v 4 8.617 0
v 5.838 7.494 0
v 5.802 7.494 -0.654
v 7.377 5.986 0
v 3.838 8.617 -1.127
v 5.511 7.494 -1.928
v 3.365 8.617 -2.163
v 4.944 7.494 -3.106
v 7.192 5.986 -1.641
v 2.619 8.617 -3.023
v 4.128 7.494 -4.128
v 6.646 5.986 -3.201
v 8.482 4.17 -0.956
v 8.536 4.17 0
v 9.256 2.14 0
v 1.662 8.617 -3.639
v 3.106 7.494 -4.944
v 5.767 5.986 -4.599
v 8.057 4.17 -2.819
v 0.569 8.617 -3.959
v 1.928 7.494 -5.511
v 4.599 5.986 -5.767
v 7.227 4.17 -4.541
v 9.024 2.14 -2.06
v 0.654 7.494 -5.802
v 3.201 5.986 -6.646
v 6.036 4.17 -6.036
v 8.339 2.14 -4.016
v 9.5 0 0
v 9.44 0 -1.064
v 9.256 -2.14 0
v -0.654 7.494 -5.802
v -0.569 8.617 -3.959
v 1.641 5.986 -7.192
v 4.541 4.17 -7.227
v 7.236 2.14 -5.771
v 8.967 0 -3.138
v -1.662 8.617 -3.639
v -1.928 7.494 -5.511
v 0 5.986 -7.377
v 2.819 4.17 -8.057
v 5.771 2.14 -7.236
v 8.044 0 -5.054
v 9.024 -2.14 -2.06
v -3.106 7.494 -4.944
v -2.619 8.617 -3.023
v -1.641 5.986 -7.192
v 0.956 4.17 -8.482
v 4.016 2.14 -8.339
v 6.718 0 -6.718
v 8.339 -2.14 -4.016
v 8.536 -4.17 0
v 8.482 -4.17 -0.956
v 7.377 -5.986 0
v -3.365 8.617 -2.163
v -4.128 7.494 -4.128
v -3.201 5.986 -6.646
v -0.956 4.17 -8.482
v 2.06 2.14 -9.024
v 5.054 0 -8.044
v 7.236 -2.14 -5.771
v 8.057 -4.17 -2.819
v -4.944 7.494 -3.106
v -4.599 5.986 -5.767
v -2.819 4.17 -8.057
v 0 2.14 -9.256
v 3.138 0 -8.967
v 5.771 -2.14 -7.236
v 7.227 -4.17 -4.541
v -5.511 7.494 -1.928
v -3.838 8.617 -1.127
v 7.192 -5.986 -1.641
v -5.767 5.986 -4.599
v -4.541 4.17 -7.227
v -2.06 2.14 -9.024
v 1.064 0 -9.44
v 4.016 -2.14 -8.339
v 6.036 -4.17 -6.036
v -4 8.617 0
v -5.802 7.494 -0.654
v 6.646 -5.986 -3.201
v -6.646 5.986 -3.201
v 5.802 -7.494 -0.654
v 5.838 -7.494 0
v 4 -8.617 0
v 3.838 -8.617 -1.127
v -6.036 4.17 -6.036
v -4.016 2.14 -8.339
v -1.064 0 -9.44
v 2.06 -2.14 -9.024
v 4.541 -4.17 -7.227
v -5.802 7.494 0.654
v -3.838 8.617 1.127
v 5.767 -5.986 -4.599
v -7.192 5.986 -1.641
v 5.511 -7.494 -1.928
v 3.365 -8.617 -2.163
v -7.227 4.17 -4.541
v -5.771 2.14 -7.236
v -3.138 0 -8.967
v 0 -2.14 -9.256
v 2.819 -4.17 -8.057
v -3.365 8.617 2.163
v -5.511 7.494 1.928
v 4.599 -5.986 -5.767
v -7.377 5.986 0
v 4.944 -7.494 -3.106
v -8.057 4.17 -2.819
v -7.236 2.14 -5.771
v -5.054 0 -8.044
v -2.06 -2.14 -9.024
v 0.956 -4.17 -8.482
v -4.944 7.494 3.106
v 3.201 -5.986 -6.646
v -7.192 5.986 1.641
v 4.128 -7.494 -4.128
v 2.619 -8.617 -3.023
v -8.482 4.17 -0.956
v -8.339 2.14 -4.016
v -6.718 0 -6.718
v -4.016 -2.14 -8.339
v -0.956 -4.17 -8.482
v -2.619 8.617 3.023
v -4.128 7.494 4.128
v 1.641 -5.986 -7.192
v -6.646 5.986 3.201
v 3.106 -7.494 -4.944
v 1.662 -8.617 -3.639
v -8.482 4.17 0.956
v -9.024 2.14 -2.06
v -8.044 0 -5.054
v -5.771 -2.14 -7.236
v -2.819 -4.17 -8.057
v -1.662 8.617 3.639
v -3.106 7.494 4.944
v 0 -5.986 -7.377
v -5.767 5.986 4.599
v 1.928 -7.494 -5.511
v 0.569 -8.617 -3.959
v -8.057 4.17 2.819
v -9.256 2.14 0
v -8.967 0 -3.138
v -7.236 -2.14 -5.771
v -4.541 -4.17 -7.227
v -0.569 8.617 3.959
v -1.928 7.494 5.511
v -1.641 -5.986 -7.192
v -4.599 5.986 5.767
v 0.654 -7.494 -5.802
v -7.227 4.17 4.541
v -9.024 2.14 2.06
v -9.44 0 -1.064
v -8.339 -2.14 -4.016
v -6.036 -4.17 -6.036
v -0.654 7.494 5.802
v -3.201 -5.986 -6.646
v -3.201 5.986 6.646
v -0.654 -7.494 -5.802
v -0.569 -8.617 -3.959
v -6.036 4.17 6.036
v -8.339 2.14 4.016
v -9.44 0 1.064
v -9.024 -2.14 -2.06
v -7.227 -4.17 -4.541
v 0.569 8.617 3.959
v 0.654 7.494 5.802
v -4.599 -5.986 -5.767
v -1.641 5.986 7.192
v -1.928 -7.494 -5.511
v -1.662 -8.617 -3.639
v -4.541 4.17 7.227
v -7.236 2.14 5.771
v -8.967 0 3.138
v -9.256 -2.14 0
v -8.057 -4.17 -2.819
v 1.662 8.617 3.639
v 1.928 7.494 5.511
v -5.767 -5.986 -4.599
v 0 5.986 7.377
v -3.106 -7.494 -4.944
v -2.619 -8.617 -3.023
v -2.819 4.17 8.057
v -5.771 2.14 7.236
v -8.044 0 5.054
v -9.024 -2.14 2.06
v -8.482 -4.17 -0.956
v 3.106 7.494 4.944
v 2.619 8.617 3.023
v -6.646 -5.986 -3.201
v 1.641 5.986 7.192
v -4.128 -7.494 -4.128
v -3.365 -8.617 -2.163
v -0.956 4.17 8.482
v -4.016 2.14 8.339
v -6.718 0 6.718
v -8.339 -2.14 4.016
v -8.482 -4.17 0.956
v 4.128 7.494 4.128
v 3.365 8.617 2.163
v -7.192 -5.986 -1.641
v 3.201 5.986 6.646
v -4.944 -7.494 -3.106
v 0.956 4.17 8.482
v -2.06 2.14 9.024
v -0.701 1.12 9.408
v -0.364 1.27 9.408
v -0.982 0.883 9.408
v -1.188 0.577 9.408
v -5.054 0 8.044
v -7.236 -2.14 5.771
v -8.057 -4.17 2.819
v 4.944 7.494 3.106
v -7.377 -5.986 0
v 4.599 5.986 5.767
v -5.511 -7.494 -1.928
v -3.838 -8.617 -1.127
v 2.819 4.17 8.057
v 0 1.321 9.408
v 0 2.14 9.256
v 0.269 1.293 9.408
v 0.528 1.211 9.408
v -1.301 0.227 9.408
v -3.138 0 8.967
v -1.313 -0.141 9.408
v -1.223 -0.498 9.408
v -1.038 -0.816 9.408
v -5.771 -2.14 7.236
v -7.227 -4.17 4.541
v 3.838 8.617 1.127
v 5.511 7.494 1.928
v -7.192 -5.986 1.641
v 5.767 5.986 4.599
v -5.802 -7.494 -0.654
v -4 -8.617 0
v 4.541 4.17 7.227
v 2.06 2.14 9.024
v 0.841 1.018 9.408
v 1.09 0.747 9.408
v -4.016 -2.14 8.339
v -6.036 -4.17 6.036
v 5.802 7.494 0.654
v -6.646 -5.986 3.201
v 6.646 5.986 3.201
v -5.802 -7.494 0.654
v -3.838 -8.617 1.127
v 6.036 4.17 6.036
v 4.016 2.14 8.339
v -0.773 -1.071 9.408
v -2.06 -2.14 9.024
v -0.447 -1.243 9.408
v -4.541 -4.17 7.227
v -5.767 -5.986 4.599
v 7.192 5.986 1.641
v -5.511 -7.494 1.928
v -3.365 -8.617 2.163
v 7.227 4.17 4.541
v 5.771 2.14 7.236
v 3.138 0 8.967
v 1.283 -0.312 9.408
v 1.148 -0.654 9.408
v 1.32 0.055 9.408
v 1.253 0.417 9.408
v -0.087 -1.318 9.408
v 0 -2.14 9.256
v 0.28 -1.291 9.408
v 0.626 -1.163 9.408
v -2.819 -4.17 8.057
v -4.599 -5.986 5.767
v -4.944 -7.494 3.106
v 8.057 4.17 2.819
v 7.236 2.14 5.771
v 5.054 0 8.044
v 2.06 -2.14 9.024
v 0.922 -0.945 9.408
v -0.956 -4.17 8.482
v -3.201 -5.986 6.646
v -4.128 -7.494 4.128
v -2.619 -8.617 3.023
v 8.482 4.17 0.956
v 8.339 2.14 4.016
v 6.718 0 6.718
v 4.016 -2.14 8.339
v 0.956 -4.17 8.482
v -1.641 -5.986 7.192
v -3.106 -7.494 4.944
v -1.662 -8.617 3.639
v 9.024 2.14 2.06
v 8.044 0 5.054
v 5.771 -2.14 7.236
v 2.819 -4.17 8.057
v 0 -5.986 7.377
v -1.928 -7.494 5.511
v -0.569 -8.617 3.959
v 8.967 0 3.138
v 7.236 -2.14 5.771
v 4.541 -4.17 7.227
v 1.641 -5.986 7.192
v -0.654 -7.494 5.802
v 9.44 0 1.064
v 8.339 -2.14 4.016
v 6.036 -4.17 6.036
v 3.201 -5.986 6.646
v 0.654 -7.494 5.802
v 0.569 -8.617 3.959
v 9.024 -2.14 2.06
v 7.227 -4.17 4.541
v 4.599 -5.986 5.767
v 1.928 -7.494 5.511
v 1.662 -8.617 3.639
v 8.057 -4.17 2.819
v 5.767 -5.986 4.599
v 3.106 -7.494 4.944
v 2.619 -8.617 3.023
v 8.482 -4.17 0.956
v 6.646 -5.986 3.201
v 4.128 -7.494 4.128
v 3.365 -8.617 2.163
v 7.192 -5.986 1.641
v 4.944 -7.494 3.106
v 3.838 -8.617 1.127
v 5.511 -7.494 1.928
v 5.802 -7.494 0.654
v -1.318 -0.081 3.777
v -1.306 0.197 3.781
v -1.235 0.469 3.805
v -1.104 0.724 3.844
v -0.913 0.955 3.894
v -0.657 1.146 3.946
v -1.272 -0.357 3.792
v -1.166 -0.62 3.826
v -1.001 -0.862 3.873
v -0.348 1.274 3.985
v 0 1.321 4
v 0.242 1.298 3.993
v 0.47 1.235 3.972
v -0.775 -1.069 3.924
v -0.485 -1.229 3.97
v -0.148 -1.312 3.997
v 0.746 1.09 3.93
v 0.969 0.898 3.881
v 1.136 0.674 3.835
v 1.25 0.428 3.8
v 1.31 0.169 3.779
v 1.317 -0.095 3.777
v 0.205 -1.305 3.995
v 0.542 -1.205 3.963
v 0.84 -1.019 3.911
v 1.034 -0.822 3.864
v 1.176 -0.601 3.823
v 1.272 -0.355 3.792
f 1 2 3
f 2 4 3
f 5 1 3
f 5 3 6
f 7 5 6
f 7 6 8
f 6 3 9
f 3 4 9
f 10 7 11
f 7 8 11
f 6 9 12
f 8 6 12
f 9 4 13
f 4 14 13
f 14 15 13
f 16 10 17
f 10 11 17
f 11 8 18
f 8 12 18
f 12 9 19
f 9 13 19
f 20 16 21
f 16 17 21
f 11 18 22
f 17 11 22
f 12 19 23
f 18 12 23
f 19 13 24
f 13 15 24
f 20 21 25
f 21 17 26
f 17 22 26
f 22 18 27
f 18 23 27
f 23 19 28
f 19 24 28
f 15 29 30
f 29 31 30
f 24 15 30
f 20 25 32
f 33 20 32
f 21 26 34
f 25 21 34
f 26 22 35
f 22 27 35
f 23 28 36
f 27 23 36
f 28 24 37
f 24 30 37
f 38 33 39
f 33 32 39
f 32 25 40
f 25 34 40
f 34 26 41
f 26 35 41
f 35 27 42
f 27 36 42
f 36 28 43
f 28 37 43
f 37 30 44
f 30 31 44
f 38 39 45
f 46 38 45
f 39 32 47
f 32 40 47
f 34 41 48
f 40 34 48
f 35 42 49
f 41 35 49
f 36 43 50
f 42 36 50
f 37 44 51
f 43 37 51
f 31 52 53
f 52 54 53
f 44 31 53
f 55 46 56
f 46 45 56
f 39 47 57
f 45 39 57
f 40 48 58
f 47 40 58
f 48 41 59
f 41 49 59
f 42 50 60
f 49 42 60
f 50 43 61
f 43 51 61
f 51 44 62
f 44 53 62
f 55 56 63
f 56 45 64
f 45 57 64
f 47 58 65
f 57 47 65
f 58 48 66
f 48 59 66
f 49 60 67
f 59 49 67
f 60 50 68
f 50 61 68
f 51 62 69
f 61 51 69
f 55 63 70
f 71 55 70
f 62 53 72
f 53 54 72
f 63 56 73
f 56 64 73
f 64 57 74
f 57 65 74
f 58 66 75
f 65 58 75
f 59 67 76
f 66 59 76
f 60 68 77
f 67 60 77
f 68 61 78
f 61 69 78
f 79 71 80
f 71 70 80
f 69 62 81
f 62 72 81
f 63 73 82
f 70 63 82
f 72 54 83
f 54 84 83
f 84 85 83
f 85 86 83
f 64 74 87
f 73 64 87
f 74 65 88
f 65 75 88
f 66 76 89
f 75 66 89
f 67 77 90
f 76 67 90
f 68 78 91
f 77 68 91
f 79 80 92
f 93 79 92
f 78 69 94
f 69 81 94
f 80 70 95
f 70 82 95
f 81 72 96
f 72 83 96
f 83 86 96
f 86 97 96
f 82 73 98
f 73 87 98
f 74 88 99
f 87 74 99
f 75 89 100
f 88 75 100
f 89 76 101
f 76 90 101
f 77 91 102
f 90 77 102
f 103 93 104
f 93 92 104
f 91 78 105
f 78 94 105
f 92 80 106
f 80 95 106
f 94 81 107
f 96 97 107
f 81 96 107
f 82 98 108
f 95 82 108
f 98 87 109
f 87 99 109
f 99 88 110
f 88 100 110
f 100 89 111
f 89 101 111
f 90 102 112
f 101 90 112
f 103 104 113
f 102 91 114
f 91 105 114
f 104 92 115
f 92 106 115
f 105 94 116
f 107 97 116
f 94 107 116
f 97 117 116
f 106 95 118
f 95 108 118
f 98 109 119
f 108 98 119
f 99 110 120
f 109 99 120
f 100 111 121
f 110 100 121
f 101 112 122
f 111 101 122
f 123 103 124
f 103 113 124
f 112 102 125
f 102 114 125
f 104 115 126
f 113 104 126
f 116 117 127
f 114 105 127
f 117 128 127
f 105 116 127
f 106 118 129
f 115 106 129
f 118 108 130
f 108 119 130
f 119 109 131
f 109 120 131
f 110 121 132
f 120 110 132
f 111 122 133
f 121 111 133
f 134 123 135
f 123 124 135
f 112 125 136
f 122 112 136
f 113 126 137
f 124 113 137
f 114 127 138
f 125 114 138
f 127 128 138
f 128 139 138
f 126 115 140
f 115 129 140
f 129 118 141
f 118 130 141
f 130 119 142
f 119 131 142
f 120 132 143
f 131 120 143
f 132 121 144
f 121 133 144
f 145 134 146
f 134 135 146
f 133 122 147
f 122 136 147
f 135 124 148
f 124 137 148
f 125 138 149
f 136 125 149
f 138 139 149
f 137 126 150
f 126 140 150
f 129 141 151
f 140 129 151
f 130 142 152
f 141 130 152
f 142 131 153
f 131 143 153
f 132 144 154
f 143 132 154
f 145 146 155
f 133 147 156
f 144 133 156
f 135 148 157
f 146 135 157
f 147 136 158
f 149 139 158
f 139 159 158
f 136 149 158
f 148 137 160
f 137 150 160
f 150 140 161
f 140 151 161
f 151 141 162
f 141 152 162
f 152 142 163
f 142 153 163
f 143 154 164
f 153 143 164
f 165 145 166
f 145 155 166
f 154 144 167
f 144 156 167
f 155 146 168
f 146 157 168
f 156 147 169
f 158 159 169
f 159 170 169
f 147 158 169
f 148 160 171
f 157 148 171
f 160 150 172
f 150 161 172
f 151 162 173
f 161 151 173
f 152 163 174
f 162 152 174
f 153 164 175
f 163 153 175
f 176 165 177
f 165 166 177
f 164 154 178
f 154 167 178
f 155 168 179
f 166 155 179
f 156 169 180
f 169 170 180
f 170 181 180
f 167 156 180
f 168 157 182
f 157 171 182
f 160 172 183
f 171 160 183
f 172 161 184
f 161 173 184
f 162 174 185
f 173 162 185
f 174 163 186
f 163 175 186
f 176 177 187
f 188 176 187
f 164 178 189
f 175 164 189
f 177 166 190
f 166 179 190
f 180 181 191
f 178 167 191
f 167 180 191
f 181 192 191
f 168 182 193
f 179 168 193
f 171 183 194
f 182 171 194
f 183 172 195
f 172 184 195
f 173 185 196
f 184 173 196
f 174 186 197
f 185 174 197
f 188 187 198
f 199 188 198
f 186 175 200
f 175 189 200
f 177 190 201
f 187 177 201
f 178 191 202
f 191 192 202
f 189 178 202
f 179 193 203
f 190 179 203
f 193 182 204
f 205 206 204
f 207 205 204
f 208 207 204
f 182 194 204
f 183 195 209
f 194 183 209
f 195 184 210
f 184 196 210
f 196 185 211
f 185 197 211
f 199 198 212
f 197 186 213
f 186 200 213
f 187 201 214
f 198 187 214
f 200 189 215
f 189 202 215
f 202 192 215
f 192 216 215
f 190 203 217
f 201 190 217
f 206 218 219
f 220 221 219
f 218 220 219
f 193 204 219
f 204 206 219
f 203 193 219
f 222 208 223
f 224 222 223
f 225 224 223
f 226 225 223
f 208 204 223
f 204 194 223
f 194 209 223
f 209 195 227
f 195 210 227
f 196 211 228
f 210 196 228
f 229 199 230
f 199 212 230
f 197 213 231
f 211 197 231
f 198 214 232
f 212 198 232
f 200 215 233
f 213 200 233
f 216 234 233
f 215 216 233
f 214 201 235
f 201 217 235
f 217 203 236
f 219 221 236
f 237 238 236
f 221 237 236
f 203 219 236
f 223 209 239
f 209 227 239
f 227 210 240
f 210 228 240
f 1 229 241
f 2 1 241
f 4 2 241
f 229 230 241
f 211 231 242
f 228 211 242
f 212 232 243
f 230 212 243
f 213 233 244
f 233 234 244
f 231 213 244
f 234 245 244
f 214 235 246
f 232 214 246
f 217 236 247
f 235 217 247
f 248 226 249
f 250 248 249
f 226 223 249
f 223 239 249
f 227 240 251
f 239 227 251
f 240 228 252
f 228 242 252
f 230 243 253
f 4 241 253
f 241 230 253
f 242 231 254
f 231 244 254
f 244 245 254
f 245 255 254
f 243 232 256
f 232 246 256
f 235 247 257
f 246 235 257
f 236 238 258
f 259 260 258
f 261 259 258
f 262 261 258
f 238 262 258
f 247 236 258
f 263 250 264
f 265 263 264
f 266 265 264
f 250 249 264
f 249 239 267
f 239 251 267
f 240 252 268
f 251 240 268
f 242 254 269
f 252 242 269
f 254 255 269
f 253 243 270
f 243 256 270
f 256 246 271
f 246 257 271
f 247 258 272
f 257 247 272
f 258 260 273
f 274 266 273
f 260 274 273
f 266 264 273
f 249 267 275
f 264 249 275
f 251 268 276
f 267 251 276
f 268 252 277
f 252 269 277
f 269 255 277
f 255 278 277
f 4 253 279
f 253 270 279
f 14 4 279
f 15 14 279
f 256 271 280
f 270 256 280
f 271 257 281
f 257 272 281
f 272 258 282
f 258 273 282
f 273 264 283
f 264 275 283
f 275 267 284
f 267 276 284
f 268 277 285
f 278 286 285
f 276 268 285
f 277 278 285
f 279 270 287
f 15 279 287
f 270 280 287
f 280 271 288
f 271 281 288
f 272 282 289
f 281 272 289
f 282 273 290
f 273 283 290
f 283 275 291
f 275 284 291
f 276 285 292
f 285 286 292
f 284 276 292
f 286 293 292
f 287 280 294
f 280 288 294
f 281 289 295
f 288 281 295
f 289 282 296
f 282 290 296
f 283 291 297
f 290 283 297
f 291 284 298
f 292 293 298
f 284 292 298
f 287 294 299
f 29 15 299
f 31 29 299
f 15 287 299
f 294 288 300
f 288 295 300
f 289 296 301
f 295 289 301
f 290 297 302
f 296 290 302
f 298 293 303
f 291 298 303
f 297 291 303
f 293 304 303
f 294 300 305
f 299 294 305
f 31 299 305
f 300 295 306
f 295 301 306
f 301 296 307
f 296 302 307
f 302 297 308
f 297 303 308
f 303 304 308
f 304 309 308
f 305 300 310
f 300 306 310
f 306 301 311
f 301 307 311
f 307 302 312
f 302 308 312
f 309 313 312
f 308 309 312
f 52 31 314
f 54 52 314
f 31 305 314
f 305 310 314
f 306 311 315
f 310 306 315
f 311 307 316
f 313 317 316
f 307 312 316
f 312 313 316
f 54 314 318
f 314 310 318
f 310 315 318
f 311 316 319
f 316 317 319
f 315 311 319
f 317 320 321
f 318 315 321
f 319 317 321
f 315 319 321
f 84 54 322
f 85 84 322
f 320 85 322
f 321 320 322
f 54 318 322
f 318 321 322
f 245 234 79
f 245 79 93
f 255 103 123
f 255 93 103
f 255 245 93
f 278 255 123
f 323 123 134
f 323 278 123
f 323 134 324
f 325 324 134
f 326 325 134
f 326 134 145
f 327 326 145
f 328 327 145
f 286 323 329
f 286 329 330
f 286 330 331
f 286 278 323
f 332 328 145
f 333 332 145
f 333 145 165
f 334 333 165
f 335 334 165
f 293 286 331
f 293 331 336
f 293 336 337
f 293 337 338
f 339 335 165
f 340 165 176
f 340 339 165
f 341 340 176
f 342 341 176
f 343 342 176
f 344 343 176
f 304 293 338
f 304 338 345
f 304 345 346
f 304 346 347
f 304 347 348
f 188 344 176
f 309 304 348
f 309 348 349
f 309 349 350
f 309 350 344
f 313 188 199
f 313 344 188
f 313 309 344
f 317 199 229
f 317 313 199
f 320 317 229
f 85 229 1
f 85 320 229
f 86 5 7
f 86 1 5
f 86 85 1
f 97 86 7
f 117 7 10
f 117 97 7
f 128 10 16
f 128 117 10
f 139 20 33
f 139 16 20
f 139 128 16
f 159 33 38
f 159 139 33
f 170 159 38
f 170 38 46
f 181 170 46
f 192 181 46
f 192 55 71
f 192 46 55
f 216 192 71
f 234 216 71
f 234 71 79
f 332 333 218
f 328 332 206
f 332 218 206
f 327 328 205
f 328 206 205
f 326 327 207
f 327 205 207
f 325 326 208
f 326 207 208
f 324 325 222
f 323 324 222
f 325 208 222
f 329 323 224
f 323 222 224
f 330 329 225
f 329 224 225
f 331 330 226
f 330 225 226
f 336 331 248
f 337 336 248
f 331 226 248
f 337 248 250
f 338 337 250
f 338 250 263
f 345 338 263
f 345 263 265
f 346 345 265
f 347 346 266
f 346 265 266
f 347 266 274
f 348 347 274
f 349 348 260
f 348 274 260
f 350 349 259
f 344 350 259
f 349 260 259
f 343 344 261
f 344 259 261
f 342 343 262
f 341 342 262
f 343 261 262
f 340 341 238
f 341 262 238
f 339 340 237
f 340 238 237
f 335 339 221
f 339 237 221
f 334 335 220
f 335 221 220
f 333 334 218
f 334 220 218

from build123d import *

# Parameters (mm, degrees)
CORTAR_EXTRUIR1_DEPTH      = 17.454482672
CORTAR_EXTRUIR1_DEPTH_BACK = 10
CROQUIS2_R                 = 4
CROQUIS4_W                 = 1.3208
CROQUIS4_H                 = 9.5


with BuildPart() as part:
    # Croquis1 → Revolución1 (revolve)
    with BuildSketch(Plane.XY):
        with BuildLine():
            Line((0, -9.5), (0, 9.5))
            ThreePointArc((0, 9.5), (9.5, 0), (0, -9.5))
        make_face()
    revolve(axis=Axis((0, -9.5, 0), (0, 1, 0)))

    # Croquis2 → Cortar-Extruir1 (cut, two sides: drawn at the far end of the back side and taken through both)
    with BuildSketch(Plane(origin=(0, 0, 0), x_dir=(1, 0, 0), z_dir=(0, 1, 0)).offset(-CORTAR_EXTRUIR1_DEPTH_BACK)):
        with Locations(Location((0, 0, 0), (0, 0, 180))):
            Circle(CROQUIS2_R)
    extrude(amount=CORTAR_EXTRUIR1_DEPTH + CORTAR_EXTRUIR1_DEPTH_BACK, mode=Mode.SUBTRACT)

    # Croquis4 → Diámetro de taladro #37 (0.104)1 (revolve, cut)
    with BuildSketch(Plane.YZ):
        with Locations((0.6604, 4.75)):
            Rectangle(CROQUIS4_W, CROQUIS4_H)
    revolve(axis=Axis((0, 0, -6.35), (0, 0, 1)), mode=Mode.SUBTRACT)


solid = part.part
